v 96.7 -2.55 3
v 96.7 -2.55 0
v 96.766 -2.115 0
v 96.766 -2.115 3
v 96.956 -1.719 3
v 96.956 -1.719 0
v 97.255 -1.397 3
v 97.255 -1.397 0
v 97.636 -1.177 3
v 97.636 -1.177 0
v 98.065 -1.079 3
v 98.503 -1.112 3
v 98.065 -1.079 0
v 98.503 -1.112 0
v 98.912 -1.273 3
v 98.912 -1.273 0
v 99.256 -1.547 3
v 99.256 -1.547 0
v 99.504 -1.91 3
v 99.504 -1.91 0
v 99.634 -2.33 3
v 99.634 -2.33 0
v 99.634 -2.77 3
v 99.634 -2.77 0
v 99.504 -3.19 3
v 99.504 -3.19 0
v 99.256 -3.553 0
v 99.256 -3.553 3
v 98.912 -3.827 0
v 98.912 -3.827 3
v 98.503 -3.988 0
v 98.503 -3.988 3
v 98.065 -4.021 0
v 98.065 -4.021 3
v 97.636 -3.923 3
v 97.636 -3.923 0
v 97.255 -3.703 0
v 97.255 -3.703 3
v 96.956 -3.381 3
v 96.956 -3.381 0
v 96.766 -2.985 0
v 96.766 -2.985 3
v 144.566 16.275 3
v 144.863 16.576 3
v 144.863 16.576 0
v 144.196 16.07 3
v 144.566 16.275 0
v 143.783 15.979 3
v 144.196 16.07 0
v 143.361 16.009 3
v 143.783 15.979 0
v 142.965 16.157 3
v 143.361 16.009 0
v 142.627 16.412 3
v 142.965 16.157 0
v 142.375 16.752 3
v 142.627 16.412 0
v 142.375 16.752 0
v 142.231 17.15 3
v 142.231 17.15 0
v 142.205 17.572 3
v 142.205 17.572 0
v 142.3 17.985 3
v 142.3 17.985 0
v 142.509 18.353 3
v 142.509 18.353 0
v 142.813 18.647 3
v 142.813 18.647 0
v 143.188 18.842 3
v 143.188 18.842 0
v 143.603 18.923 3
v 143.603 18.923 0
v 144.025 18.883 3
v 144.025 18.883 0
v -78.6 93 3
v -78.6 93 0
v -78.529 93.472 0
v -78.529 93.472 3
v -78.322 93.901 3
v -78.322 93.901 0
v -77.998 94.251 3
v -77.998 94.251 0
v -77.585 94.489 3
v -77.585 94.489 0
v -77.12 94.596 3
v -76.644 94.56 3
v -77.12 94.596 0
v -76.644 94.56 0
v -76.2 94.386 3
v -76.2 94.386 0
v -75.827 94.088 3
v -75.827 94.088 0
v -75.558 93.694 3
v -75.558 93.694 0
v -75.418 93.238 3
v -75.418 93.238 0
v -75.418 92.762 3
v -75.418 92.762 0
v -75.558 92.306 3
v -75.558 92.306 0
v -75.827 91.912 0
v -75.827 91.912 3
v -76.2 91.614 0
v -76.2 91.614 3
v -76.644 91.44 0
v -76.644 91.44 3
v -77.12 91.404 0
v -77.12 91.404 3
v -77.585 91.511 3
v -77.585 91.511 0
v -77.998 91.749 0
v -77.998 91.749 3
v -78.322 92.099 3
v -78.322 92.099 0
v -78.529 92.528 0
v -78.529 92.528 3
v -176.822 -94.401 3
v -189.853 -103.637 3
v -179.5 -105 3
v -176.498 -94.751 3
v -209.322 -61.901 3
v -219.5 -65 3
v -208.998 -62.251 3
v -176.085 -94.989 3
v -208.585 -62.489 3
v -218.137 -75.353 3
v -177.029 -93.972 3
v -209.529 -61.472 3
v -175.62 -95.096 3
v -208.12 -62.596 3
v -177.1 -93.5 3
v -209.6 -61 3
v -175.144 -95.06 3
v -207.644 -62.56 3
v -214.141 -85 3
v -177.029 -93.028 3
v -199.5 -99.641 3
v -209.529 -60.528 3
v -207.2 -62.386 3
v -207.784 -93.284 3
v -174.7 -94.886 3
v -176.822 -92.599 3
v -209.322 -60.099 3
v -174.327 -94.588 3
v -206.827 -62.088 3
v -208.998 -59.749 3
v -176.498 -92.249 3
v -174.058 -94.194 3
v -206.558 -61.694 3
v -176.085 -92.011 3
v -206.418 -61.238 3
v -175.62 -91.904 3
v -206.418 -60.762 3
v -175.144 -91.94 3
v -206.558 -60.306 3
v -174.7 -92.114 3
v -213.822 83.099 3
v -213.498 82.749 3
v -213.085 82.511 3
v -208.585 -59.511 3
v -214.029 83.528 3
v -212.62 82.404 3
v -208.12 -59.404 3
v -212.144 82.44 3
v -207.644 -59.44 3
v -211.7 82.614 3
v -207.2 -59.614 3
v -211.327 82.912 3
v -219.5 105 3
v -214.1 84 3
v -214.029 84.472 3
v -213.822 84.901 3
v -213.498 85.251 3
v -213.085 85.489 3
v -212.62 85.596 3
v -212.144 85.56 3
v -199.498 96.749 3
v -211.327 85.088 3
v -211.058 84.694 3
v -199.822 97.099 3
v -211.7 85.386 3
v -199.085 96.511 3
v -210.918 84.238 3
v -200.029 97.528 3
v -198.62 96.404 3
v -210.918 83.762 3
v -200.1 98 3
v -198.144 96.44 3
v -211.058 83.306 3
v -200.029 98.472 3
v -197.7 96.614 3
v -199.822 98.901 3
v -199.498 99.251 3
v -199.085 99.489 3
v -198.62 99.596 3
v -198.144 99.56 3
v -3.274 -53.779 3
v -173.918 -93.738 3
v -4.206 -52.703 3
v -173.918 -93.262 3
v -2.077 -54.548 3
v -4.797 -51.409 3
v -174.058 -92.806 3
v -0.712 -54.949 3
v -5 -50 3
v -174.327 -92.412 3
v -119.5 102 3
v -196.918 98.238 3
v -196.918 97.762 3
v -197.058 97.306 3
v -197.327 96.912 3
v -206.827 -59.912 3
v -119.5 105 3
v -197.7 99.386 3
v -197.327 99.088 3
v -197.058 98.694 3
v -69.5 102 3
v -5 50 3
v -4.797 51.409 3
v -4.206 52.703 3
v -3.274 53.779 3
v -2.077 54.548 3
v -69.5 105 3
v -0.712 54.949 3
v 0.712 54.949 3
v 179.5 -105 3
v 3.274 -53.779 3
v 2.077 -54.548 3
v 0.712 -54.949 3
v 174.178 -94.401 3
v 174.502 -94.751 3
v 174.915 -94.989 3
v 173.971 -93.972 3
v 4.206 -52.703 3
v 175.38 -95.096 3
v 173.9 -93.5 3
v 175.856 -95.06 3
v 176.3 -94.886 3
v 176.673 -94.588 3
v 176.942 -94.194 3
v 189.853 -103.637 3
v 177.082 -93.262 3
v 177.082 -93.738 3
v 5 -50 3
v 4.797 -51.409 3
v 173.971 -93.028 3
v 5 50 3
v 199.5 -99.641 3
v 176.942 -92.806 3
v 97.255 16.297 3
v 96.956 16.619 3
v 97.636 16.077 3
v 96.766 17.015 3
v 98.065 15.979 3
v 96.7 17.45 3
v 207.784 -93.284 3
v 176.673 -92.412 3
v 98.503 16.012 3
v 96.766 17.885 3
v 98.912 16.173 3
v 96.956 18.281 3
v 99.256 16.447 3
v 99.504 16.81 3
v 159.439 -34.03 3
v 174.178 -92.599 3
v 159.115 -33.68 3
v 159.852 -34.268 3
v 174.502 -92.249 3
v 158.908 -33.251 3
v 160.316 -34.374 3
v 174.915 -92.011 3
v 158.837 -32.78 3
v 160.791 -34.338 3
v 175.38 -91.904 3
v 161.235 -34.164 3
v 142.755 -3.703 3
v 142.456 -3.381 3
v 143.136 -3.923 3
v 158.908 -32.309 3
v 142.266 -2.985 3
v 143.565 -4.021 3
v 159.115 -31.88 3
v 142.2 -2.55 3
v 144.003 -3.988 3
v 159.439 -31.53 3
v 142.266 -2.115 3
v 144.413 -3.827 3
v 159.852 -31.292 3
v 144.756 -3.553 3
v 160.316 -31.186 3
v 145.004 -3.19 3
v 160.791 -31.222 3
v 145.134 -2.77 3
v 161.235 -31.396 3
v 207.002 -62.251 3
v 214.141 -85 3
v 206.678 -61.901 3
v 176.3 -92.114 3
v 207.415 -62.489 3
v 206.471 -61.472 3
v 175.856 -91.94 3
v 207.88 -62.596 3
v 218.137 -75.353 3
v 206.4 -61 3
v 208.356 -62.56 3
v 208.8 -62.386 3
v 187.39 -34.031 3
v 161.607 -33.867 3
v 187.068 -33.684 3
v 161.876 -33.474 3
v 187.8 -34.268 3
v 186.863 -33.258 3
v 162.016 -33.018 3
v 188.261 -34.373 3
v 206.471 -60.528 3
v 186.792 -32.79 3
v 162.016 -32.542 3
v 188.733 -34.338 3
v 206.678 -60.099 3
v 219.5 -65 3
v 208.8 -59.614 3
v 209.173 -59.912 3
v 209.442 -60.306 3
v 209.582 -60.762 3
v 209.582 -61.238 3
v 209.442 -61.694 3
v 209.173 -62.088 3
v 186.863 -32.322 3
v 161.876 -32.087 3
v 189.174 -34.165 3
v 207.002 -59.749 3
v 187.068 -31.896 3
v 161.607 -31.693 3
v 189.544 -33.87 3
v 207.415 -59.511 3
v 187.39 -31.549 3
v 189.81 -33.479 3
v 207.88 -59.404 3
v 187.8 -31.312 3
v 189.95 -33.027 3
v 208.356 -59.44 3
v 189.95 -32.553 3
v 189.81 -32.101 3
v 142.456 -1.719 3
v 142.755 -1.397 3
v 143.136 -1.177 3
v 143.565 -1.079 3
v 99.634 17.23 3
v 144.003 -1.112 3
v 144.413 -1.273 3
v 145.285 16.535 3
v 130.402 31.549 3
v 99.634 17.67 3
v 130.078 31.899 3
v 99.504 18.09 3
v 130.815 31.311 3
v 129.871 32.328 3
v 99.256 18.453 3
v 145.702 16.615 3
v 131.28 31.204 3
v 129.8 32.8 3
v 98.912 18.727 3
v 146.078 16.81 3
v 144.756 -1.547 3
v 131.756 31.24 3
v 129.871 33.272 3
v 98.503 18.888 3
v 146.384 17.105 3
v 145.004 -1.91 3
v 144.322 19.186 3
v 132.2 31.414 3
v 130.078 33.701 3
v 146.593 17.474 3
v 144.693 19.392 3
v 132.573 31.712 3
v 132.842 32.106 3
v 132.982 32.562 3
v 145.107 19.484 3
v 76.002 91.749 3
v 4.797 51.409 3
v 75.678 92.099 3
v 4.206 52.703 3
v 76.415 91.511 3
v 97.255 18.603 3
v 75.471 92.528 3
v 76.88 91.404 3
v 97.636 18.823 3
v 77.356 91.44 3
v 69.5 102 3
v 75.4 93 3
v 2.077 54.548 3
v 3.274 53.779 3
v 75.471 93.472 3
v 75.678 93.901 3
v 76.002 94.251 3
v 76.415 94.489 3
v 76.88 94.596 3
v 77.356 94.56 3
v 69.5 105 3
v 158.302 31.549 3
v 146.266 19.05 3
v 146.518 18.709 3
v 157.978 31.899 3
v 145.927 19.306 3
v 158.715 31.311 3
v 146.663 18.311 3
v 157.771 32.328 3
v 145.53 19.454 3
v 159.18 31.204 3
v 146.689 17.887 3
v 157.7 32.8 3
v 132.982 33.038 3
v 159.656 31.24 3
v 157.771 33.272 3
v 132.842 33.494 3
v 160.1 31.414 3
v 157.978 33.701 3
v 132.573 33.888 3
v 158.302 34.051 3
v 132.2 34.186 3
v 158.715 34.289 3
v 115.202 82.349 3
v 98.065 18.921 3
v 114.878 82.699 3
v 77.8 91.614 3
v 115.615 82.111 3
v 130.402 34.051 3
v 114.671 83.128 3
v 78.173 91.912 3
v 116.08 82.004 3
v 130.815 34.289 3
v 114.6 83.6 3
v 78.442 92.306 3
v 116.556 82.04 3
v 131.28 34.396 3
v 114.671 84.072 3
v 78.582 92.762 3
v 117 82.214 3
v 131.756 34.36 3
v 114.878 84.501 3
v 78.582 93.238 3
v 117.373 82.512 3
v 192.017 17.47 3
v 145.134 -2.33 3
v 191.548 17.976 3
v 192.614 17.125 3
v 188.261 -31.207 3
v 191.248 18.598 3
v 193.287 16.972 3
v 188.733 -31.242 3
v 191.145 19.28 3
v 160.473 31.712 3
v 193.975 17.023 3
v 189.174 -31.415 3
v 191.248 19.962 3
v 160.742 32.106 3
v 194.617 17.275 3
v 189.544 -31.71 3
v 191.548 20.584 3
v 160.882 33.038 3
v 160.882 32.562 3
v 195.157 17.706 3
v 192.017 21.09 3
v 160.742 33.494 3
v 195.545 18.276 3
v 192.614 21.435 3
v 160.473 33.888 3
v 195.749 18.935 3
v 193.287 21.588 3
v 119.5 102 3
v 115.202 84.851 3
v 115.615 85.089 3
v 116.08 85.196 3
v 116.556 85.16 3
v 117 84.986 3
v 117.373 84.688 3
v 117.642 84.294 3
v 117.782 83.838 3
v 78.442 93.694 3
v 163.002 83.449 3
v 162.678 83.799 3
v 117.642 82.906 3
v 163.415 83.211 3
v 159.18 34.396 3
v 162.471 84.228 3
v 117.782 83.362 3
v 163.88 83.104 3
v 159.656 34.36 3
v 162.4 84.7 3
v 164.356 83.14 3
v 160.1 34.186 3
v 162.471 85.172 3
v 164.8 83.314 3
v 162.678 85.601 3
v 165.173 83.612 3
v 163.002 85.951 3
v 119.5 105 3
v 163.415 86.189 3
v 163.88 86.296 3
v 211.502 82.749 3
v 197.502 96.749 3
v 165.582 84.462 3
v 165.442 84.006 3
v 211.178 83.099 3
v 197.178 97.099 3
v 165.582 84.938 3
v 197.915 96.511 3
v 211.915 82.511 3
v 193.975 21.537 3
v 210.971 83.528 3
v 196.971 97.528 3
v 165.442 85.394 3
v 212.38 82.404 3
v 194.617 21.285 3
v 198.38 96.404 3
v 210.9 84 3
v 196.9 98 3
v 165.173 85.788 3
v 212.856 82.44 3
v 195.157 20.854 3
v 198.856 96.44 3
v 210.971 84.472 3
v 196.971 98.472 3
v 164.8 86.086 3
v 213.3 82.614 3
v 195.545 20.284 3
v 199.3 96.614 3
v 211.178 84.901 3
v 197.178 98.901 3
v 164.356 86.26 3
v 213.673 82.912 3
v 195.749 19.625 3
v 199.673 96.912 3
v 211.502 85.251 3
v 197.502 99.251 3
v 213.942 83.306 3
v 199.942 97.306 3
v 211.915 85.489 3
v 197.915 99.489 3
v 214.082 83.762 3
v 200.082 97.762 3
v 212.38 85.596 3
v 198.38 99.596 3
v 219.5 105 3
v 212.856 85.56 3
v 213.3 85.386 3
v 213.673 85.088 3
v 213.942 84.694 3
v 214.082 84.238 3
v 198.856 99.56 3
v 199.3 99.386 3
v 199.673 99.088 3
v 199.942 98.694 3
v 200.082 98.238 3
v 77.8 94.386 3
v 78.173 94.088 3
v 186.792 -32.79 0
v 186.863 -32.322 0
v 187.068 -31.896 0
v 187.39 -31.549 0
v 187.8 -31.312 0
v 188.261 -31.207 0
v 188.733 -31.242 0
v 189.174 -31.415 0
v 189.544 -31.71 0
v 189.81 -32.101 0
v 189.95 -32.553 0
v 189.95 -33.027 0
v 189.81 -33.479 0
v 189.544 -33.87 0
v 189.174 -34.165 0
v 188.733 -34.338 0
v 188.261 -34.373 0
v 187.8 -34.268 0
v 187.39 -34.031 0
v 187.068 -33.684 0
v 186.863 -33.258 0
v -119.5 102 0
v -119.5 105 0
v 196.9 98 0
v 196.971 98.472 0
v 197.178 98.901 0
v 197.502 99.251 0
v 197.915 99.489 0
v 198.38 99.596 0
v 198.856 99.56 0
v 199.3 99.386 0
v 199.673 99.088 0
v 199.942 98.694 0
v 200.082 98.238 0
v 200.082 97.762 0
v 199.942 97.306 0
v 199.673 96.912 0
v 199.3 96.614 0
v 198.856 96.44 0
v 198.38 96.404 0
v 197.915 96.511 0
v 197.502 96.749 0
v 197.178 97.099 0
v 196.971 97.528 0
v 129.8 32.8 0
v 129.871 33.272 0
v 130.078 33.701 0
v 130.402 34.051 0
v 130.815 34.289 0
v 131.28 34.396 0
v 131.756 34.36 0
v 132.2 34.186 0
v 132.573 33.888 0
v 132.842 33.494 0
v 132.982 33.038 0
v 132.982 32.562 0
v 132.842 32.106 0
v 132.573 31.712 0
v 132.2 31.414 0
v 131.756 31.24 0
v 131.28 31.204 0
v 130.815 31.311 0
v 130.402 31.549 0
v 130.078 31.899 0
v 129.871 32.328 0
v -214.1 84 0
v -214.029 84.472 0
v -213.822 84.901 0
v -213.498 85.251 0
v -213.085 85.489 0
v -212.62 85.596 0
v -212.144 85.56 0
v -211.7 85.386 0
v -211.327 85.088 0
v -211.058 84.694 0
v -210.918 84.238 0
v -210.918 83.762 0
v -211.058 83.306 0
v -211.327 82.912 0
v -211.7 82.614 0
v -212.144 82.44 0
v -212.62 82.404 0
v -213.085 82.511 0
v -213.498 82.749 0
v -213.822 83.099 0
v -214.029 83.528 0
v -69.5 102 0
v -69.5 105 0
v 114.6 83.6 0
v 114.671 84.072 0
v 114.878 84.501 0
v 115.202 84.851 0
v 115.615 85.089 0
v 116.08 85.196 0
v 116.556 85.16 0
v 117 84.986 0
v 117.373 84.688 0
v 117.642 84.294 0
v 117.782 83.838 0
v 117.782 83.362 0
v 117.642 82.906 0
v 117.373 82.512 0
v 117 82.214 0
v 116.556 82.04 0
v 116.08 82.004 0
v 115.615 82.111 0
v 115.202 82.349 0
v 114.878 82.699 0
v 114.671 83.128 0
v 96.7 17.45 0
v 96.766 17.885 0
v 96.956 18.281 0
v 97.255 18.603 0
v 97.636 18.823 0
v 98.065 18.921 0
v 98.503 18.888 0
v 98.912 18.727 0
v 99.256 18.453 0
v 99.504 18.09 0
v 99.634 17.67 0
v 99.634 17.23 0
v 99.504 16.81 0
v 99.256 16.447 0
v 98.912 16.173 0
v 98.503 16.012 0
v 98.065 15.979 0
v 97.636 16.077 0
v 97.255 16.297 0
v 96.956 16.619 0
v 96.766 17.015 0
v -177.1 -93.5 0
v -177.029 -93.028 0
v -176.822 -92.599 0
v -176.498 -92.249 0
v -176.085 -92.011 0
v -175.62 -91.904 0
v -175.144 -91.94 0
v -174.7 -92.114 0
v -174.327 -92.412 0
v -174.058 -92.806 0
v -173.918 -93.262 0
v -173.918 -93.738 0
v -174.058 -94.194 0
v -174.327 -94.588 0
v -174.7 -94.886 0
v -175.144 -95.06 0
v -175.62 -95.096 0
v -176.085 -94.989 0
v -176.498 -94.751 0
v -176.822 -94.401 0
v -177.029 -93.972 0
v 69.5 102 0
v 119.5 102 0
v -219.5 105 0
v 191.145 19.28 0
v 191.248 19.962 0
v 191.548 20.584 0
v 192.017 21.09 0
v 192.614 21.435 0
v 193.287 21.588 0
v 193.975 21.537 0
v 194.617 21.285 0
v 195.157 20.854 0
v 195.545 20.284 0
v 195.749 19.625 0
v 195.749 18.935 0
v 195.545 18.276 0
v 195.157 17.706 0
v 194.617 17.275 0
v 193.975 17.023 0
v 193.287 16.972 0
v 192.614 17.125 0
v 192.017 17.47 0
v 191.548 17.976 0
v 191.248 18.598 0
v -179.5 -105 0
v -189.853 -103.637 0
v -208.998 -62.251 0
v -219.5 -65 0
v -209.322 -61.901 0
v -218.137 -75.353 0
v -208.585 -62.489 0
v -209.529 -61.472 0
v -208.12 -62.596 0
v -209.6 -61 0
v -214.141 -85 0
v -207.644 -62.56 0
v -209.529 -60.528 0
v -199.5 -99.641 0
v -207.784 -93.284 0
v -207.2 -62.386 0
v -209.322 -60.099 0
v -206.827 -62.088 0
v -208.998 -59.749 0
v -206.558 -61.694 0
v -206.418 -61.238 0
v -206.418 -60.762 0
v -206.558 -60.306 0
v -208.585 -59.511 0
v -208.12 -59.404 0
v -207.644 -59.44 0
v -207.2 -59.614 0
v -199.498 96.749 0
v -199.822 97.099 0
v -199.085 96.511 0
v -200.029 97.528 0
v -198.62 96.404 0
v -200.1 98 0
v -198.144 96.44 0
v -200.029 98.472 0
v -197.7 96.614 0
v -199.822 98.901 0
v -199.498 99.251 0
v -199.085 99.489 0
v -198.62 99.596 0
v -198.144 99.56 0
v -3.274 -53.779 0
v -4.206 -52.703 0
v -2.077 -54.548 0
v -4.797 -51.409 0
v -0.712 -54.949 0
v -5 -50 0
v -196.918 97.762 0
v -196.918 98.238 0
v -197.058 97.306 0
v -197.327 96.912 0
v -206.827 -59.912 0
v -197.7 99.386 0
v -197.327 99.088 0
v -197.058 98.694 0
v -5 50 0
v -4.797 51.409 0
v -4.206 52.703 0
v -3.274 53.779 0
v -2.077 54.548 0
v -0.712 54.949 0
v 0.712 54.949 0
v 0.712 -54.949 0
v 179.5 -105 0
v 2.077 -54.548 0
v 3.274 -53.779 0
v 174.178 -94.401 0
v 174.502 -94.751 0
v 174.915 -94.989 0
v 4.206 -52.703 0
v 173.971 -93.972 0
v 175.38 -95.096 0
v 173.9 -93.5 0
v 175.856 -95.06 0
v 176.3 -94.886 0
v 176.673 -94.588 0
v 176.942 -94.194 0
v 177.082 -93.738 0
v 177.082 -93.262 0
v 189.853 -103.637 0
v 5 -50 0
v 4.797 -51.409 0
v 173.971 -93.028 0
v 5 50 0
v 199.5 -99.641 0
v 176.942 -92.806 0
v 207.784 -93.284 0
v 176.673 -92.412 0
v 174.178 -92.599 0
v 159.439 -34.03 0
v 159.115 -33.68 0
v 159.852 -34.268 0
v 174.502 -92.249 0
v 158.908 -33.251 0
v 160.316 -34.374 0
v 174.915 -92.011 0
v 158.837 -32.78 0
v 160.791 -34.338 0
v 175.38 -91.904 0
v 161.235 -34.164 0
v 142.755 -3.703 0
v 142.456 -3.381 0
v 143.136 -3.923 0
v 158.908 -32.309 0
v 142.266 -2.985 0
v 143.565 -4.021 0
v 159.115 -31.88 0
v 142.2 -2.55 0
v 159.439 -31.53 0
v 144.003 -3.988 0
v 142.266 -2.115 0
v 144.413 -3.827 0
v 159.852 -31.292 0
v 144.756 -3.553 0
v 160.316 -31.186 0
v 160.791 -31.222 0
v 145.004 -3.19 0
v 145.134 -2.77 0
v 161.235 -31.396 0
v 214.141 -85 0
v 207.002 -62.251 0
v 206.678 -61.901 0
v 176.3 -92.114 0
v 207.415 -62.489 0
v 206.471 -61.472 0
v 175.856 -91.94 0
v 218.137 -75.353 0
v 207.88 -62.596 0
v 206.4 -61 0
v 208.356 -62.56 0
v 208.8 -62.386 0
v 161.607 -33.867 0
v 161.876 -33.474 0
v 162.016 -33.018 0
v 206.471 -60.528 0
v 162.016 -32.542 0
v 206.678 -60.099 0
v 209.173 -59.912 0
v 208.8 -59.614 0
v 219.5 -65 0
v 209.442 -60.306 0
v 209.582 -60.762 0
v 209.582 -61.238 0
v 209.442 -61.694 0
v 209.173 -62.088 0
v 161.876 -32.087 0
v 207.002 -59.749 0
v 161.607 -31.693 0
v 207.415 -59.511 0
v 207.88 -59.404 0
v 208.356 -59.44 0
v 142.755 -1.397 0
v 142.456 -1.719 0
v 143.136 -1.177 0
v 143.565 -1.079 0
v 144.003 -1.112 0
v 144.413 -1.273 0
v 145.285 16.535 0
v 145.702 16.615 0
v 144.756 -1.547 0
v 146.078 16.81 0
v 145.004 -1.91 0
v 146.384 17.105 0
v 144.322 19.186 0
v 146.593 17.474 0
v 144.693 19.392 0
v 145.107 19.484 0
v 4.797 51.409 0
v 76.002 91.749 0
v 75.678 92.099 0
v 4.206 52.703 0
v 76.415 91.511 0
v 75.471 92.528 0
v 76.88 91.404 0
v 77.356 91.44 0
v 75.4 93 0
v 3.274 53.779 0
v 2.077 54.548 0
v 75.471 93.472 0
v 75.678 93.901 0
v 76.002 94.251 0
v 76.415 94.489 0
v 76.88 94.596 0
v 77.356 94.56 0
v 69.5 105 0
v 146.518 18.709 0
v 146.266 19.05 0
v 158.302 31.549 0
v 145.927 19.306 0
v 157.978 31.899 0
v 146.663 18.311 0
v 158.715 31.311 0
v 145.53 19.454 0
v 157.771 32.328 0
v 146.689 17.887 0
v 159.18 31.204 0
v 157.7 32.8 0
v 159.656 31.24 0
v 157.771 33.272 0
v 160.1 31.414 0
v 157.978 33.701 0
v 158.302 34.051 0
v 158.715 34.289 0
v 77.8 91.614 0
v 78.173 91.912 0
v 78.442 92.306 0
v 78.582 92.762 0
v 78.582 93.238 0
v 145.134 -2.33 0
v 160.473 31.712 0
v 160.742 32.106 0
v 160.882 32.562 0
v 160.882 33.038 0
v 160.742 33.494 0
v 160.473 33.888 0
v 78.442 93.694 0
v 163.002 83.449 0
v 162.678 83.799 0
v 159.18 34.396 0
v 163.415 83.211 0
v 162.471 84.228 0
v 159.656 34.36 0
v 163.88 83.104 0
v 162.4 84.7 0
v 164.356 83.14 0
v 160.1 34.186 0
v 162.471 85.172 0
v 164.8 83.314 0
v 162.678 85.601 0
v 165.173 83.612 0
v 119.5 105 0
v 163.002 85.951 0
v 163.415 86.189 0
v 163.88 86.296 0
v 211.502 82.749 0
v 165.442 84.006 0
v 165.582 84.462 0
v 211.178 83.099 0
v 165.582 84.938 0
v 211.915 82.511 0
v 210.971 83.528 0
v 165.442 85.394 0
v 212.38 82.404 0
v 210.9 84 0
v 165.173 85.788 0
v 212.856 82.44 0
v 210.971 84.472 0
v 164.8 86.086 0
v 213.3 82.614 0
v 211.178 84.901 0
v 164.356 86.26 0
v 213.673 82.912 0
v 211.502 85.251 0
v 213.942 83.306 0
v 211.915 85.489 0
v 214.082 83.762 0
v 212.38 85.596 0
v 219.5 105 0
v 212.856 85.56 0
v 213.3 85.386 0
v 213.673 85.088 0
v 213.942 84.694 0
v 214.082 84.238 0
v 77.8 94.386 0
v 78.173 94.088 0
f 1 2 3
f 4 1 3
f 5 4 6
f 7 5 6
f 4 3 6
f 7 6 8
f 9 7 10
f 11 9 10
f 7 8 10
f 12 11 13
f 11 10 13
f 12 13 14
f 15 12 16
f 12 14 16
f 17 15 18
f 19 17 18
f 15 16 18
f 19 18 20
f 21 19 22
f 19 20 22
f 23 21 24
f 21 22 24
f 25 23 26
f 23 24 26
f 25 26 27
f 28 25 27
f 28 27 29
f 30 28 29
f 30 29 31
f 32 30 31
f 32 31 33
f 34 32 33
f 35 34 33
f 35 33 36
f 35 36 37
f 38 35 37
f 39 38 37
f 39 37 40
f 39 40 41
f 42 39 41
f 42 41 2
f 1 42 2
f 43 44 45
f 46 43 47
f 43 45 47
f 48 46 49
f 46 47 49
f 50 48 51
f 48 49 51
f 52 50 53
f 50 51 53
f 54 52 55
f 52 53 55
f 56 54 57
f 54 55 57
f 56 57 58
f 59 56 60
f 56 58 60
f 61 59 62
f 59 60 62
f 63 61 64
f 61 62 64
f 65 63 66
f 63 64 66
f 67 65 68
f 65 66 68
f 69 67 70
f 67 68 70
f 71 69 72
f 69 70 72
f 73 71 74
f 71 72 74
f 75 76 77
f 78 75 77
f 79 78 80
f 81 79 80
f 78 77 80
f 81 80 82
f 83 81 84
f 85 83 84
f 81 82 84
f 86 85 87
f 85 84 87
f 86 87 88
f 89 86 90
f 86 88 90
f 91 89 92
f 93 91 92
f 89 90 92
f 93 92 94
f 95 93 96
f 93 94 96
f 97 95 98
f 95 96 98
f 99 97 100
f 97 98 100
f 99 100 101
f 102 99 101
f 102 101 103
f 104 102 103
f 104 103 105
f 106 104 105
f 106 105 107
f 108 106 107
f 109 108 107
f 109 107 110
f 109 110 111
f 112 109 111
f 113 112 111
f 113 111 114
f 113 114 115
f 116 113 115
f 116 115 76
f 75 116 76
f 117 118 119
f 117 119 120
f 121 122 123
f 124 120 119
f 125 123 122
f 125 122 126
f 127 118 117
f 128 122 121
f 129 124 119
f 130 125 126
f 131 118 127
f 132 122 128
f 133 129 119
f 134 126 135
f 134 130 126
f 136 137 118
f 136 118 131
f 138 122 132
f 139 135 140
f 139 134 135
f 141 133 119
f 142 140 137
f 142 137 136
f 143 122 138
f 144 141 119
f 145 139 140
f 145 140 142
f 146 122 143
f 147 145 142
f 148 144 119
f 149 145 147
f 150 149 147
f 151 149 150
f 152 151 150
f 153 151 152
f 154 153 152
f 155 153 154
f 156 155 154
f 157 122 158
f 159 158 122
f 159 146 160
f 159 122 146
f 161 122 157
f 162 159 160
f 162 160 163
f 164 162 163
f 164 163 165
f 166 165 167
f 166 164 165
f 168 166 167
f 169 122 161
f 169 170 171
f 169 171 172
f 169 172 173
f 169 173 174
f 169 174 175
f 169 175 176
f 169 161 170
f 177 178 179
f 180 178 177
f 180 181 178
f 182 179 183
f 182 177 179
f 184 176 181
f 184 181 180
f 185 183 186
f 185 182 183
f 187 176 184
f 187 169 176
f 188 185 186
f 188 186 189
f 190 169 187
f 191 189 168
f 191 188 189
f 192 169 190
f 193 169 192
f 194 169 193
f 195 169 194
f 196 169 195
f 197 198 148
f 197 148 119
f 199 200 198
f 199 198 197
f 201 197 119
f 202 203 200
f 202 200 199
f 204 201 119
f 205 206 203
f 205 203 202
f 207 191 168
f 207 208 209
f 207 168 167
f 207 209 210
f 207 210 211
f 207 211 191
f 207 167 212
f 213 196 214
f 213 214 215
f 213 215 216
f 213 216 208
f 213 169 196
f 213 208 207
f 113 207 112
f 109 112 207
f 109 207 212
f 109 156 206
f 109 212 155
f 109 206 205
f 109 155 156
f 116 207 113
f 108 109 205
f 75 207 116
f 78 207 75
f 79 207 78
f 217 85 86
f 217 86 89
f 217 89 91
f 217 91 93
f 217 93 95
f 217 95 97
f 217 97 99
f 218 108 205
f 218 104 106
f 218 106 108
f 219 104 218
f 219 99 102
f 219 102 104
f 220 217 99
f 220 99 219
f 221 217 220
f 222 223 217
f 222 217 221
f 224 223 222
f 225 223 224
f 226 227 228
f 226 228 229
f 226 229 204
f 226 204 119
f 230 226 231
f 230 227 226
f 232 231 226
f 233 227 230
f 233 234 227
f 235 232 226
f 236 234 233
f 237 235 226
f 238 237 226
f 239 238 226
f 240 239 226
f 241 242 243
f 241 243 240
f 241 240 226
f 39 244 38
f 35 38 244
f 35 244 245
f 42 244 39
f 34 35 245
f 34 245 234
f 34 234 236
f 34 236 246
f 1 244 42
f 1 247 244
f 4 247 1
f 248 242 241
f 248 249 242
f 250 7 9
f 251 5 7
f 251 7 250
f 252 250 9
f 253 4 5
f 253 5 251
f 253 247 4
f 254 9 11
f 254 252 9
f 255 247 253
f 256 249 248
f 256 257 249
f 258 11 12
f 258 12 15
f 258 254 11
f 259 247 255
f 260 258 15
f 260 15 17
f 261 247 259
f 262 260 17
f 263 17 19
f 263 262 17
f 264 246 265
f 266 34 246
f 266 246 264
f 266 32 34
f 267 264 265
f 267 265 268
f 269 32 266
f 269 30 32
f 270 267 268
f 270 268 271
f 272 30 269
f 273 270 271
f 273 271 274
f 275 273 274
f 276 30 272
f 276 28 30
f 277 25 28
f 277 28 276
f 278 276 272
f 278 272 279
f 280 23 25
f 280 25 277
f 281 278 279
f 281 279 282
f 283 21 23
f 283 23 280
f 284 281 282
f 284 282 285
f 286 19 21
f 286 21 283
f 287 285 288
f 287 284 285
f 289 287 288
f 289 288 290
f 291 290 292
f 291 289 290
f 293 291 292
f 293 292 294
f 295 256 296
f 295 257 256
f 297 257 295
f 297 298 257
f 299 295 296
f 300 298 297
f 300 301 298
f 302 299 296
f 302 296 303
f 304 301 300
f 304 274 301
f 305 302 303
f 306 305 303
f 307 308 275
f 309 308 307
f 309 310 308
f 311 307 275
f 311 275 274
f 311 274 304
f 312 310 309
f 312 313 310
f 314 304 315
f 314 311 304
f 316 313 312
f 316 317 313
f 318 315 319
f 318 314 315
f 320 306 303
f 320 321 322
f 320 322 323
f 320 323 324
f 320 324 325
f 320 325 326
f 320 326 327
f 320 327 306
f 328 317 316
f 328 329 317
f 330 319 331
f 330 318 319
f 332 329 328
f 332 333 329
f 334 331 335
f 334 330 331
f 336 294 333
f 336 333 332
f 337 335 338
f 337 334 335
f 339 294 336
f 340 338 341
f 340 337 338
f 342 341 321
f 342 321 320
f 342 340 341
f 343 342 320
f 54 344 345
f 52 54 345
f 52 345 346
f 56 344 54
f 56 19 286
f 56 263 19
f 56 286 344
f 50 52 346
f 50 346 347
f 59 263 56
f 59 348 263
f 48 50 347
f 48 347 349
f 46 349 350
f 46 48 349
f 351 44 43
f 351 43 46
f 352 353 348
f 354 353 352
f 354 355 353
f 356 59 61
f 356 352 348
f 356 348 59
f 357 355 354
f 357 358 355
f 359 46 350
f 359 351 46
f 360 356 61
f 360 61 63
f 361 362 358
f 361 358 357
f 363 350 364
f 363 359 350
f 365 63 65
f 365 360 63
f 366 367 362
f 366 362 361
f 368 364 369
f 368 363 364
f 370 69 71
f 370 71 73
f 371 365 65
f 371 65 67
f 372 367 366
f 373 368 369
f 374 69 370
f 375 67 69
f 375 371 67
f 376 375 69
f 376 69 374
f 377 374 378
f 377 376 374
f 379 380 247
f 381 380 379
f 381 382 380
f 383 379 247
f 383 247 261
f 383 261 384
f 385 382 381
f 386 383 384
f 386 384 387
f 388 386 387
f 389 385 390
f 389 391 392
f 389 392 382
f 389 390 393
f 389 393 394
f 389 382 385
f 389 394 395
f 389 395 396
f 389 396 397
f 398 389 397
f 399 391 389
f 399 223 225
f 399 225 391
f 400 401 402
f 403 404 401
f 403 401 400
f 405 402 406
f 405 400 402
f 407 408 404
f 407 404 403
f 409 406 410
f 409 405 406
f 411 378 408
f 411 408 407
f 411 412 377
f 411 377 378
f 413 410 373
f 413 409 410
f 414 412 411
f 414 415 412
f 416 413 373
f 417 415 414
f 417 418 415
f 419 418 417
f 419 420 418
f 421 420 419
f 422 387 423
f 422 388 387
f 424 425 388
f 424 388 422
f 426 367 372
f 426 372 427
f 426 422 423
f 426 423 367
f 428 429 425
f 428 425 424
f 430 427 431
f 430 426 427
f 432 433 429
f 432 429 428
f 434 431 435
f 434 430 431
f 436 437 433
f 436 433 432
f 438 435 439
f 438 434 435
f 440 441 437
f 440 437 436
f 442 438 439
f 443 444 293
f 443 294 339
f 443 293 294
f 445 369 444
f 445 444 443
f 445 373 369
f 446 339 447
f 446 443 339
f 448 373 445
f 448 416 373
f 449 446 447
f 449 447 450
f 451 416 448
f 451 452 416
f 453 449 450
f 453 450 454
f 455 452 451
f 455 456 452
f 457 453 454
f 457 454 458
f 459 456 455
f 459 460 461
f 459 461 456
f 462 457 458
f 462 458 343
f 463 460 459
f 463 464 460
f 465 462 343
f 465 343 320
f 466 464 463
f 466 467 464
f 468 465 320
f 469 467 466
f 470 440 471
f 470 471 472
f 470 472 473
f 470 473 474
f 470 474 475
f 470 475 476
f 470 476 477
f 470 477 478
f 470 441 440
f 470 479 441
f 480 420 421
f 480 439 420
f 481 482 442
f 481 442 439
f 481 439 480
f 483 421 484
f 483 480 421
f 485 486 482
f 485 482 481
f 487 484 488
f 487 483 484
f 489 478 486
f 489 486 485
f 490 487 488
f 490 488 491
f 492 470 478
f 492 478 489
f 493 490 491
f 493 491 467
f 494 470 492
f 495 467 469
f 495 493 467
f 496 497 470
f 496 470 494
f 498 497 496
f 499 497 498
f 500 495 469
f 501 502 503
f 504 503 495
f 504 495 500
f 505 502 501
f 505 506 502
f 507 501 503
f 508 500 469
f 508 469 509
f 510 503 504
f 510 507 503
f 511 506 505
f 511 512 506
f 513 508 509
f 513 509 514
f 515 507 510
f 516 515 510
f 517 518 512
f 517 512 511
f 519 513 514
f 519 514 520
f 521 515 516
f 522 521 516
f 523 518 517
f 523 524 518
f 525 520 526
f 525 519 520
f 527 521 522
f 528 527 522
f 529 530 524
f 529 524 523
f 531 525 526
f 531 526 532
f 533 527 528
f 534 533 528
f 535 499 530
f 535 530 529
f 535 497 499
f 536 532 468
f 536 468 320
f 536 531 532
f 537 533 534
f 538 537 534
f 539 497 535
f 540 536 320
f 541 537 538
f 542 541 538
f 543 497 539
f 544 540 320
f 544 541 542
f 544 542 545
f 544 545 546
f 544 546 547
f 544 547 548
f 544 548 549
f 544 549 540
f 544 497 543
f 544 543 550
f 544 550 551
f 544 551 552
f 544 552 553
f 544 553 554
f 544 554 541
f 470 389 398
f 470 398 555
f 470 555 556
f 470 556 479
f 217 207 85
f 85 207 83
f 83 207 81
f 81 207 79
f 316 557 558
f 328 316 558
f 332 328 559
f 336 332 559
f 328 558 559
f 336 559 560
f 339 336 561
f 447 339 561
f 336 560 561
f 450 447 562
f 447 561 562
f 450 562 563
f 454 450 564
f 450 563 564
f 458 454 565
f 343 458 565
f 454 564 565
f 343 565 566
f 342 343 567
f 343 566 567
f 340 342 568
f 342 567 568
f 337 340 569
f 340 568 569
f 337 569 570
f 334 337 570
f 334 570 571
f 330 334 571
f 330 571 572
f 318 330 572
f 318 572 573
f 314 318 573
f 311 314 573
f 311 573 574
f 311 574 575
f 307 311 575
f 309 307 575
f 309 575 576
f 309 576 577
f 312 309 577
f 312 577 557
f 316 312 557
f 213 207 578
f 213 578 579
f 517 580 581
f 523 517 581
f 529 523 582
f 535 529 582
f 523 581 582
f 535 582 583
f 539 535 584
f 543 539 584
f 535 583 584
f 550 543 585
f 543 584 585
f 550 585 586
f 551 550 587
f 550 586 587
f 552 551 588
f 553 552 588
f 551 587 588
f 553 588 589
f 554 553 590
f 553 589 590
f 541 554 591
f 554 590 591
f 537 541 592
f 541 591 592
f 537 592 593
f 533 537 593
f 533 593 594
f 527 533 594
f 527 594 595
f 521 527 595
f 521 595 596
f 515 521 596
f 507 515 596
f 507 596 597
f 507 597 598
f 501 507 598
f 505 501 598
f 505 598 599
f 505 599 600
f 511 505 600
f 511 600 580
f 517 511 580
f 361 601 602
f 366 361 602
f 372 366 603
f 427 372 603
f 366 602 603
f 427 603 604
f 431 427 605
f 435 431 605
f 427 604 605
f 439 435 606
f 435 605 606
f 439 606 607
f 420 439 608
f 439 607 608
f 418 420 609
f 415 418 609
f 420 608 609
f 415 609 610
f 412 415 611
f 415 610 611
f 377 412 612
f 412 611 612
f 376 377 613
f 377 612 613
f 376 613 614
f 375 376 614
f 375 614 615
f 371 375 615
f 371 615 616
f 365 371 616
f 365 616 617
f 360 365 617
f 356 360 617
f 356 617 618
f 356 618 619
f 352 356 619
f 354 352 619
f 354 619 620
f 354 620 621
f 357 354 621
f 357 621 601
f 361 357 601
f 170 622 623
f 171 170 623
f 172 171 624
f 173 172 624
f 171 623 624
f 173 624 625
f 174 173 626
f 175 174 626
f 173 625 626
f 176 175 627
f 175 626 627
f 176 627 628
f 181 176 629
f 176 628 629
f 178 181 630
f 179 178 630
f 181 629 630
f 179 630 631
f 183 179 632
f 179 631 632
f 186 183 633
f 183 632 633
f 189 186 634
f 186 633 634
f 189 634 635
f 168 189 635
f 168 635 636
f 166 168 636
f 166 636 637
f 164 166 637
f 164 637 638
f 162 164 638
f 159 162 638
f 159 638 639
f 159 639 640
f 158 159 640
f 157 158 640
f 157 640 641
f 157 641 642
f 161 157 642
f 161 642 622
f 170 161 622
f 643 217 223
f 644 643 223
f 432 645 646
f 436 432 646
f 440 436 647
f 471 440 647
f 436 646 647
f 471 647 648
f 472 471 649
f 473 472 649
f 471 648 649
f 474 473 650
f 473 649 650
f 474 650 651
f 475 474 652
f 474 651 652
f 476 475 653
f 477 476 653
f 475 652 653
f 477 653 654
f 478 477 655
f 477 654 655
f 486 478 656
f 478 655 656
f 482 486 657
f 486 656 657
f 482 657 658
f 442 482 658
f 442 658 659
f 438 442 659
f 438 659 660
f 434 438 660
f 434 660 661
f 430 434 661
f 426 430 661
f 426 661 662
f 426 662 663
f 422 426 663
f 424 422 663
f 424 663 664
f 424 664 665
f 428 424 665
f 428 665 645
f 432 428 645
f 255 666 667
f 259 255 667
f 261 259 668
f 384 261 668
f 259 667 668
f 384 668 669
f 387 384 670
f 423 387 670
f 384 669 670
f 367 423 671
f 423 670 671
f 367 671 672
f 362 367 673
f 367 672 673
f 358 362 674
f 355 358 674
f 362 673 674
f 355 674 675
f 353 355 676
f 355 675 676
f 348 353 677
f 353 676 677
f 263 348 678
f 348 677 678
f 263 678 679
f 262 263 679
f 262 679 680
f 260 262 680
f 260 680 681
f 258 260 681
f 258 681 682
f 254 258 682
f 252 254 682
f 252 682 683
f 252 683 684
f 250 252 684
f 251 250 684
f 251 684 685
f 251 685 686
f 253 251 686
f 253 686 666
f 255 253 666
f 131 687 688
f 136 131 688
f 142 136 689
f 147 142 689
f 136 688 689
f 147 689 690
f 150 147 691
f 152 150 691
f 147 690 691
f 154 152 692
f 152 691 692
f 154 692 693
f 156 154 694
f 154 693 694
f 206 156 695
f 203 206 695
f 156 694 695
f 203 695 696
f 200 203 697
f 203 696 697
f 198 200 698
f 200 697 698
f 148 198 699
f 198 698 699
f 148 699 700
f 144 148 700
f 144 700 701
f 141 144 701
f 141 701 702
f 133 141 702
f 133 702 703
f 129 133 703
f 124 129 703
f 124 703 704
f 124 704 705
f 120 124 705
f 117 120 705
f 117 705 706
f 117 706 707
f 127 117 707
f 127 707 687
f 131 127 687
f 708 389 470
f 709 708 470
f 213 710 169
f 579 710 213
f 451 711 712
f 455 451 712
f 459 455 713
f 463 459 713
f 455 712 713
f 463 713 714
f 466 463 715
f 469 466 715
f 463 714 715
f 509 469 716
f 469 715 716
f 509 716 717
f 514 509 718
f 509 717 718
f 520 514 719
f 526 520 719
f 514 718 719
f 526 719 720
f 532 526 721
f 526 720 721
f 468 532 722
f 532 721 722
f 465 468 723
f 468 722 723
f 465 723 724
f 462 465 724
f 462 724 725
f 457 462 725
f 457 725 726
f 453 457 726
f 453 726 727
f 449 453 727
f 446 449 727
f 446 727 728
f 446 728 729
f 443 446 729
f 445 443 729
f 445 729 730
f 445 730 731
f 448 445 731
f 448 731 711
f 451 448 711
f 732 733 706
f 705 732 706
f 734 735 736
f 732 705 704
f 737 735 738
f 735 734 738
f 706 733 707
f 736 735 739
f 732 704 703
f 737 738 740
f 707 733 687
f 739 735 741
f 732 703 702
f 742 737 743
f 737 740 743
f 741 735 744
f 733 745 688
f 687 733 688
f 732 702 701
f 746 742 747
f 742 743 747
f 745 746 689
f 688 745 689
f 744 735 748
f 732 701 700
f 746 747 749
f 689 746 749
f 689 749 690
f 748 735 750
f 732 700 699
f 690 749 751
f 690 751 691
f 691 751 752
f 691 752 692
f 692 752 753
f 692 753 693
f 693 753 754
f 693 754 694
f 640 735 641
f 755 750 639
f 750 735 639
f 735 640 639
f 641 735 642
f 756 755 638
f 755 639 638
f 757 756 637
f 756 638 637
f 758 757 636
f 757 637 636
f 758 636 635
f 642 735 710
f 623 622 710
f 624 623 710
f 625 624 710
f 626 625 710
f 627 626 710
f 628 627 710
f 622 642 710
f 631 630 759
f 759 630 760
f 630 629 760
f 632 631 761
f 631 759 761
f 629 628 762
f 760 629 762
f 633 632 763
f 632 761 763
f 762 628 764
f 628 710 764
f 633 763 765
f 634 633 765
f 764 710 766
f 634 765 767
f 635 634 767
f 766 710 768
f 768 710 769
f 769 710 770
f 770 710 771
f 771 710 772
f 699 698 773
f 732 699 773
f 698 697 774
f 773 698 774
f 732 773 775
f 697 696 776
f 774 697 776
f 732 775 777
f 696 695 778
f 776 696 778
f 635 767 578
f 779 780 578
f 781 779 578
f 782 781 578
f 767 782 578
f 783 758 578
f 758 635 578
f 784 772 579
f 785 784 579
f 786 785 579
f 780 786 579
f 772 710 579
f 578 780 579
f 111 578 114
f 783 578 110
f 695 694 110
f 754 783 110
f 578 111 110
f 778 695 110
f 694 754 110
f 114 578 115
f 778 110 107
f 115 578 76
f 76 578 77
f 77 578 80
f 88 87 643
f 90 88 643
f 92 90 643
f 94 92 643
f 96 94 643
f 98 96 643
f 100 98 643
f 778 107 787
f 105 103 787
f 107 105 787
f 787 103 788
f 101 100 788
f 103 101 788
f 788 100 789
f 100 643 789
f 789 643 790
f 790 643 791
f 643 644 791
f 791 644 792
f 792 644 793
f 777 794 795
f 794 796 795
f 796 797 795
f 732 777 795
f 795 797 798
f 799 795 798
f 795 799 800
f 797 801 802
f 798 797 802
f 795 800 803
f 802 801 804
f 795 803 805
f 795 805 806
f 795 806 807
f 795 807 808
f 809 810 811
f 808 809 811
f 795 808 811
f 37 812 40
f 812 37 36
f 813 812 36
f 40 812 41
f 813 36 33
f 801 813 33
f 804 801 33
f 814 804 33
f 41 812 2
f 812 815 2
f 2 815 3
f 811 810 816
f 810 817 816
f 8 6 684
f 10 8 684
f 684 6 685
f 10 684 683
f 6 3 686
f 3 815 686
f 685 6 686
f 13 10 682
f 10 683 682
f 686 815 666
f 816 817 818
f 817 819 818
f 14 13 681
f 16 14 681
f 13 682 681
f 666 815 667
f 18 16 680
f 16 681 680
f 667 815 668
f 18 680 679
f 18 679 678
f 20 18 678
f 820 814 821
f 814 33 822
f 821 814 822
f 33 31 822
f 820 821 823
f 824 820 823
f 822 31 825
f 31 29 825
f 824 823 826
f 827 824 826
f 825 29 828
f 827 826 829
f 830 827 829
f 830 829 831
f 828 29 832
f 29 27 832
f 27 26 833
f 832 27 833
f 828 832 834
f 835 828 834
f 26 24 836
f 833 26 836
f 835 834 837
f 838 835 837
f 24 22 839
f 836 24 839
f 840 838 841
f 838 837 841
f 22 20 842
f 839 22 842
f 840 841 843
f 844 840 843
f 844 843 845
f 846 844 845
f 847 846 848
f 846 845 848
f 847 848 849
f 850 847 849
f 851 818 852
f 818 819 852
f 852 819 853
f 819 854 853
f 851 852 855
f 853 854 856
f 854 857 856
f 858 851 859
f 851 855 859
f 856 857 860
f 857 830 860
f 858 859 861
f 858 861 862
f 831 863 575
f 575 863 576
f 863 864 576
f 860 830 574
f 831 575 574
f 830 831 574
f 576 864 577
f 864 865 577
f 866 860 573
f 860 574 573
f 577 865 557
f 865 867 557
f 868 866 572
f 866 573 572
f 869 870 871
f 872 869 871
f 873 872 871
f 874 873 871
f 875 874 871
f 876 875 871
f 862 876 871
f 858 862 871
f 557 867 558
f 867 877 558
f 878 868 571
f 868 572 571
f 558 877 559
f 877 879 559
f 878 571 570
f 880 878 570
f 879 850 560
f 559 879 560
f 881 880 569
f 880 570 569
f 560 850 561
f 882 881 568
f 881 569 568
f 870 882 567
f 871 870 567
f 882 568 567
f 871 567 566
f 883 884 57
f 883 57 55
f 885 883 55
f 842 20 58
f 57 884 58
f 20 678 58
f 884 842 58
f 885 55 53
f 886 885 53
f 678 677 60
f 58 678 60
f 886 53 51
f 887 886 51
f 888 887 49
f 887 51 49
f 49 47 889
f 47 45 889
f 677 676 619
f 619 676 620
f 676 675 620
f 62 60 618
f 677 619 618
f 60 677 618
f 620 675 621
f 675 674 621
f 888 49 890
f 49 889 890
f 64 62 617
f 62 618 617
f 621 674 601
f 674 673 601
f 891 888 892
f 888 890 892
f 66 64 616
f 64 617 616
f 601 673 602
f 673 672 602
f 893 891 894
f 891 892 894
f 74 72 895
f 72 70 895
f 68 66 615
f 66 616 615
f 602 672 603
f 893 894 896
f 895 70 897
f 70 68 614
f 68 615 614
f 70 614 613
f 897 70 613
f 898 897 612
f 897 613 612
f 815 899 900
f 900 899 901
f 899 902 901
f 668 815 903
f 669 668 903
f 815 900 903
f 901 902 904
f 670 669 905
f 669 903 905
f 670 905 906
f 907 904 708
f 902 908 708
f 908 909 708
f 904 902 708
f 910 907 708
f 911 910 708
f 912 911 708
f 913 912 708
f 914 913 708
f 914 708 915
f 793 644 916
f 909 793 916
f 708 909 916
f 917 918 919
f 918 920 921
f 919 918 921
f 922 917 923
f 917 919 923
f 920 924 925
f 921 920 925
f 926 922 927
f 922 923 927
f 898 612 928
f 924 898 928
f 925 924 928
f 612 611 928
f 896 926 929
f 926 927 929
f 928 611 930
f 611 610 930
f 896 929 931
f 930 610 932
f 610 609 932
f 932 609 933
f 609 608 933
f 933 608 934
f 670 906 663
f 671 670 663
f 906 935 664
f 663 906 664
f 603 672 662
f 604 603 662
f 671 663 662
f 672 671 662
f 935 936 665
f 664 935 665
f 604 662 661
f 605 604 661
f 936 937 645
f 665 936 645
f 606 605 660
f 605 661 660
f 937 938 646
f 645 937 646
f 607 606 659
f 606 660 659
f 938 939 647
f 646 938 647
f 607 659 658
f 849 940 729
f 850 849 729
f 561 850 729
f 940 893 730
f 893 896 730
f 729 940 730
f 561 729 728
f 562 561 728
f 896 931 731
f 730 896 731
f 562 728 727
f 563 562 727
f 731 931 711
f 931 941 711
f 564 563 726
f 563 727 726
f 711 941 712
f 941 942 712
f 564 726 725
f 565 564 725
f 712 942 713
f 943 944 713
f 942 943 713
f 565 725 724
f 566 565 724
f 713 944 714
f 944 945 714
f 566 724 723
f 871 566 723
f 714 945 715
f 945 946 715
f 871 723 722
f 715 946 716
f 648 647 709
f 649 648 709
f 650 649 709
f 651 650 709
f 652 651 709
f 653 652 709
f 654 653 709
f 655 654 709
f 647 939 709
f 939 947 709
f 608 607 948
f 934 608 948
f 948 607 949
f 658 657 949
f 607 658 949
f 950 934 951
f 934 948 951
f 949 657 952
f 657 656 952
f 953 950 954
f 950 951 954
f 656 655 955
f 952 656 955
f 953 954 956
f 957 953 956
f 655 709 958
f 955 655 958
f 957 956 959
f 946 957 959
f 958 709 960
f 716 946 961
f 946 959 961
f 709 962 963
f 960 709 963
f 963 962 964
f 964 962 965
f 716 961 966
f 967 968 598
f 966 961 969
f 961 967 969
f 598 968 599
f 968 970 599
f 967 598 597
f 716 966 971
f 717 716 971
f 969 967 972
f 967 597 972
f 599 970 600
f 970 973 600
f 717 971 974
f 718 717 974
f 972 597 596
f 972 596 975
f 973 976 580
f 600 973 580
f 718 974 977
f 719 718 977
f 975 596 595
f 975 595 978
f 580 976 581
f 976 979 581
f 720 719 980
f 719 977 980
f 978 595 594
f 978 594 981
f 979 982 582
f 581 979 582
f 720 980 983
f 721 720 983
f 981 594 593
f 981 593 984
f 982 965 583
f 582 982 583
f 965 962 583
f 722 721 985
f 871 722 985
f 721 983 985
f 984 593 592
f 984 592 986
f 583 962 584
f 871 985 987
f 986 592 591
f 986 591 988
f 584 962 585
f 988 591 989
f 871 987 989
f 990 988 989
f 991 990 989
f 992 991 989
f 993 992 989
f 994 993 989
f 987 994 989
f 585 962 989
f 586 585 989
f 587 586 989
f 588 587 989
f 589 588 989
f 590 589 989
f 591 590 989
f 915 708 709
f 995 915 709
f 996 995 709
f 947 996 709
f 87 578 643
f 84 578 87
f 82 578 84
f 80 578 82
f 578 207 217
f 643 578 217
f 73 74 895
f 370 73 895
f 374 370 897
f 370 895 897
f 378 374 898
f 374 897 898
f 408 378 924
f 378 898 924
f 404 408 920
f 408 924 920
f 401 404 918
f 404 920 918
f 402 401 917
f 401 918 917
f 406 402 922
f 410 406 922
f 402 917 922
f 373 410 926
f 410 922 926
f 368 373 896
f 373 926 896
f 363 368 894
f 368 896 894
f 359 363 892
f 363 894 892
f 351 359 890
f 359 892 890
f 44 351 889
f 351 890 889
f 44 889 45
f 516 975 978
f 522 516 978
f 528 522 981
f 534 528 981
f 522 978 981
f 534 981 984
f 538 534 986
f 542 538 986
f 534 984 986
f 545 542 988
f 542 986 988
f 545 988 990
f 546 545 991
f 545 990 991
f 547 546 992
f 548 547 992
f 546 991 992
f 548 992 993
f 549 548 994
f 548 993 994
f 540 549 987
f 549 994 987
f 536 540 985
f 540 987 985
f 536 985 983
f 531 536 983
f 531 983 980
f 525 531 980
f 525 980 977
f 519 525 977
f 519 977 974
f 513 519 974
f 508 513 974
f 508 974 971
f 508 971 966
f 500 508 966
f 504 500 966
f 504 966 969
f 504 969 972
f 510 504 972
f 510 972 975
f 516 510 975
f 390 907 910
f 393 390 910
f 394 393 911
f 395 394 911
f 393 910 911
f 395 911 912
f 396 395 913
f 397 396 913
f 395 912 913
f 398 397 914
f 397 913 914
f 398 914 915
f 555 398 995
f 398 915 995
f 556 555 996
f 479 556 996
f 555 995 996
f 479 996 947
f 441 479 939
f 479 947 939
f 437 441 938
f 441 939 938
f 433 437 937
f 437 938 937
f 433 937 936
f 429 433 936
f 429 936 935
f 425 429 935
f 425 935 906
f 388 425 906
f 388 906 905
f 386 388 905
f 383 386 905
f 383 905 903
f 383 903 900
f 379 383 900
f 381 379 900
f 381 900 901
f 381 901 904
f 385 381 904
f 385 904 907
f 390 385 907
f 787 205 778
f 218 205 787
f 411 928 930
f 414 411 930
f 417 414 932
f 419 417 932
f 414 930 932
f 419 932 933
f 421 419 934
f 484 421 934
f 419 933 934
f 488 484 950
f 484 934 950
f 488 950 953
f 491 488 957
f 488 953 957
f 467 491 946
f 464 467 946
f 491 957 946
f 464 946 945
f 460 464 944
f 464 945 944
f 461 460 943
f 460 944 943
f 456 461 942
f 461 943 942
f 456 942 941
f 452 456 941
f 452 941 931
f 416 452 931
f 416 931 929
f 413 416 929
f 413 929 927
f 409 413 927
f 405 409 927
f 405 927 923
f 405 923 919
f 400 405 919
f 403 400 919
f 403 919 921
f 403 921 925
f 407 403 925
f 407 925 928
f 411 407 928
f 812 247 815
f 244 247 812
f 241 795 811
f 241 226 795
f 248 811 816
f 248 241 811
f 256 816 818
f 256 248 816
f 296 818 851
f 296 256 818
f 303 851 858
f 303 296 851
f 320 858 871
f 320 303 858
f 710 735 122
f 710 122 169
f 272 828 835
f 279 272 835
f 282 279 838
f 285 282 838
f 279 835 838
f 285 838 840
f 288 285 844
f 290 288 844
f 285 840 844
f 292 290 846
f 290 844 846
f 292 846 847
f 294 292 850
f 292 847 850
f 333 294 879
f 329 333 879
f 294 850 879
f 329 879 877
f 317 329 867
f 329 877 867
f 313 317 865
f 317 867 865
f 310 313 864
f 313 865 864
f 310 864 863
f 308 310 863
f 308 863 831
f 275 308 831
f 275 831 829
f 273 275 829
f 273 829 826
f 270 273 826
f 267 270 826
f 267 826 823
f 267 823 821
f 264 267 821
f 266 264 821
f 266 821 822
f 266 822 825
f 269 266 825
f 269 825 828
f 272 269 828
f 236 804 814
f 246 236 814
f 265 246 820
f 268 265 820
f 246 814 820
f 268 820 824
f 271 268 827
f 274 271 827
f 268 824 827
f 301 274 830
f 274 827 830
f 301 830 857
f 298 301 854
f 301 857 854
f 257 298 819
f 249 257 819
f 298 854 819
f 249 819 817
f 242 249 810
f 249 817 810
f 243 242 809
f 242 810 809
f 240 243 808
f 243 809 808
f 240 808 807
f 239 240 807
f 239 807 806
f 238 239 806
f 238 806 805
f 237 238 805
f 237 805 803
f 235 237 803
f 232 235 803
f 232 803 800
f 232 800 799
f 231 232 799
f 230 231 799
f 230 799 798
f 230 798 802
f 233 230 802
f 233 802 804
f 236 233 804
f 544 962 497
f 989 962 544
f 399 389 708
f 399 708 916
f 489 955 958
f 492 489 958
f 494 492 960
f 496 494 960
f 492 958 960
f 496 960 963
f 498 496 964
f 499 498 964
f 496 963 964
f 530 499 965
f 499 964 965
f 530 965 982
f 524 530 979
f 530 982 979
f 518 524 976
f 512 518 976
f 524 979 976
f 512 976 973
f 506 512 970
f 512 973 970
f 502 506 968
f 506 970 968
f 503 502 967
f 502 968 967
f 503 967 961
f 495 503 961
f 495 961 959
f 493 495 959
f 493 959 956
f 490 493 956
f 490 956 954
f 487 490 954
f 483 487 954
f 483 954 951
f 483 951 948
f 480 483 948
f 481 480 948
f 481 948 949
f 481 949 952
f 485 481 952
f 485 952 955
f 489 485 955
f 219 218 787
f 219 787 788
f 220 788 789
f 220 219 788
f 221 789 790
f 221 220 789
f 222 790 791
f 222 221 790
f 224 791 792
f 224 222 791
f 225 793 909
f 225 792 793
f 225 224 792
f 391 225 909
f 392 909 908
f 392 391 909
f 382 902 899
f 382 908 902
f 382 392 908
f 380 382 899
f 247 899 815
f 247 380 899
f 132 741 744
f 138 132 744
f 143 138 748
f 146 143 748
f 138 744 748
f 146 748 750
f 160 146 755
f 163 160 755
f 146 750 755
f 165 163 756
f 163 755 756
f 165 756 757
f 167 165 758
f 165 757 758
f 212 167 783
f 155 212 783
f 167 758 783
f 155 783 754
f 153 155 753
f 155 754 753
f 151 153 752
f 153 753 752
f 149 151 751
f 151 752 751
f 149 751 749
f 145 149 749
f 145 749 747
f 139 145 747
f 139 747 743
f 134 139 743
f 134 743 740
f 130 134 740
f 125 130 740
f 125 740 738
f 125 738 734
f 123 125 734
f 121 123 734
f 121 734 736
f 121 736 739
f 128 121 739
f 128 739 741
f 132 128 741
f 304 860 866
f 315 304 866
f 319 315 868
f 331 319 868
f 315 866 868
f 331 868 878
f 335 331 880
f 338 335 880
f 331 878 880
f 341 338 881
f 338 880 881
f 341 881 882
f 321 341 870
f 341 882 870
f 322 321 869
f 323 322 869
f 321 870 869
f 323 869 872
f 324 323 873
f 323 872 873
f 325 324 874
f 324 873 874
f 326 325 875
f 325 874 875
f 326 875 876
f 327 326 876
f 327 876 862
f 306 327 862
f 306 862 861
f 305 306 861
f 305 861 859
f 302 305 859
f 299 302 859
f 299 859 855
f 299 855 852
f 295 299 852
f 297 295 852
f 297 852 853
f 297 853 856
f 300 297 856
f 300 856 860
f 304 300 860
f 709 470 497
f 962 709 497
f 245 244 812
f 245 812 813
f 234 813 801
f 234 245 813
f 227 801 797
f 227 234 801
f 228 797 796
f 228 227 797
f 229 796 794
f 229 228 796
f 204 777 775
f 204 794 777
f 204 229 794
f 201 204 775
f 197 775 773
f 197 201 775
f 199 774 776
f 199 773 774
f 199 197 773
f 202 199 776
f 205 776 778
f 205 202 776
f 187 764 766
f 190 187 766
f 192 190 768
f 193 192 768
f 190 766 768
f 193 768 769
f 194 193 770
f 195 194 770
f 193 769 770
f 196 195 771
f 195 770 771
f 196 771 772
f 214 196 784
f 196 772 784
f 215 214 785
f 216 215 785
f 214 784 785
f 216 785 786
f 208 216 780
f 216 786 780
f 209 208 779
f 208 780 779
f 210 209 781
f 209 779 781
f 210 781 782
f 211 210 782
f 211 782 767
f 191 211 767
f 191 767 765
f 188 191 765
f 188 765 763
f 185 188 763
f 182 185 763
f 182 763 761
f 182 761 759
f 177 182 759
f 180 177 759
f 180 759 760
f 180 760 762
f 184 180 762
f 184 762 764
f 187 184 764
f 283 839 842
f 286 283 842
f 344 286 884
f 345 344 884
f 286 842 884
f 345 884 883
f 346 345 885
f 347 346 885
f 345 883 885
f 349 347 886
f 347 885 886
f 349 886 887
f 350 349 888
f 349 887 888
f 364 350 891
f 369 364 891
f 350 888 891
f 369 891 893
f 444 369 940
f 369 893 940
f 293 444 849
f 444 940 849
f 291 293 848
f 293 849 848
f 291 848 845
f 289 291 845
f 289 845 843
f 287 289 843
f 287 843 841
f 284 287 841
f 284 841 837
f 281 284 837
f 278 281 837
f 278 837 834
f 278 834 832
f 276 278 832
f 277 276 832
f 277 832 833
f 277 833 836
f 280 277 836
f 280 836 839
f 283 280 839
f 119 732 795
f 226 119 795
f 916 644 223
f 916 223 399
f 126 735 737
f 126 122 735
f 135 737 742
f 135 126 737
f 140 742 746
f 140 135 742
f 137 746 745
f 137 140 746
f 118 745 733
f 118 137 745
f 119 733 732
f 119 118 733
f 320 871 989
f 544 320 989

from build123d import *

# Parameters (mm, degrees)
ESQUISSE1_W             = 439
ESQUISSE1_H             = 210
BOSS_EXTRU_1_DEPTH      = 3
ESQUISSE5_R             = 1.477381552
ESQUISSE5_R_2           = 1.598396888
ESQUISSE5_R_3           = 1.5875
ESQUISSE5_R_4           = 2.314661152
ENL_V_MAT_EXTRU_3_DEPTH = 4
ESQUISSE10_W            = 50
ESQUISSE10_H            = 3
ENL_V_MAT_EXTRU_5_DEPTH = 4
ENL_V_MAT_EXTRU_6_DEPTH = 244.33978302
FILLET1_R               = 40
SKETCH1_R               = 1.6
CUT_EXTRUDE1_DEPTH      = 244.33978302
SKETCH2_R               = 1.6
CUT_EXTRUDE2_DEPTH      = 244.33978302
SKETCH3_R               = 1.6
CUT_EXTRUDE3_DEPTH      = 244.33978302
SKETCH4_R               = 1.6
CUT_EXTRUDE4_DEPTH      = 244.33978302
SKETCH5_R               = 1.6
CUT_EXTRUDE5_DEPTH      = 244.33978302
SKETCH7_R               = 1.6
CUT_EXTRUDE6_DEPTH      = 244.33978302
SKETCH8_R               = 1.475
CUT_EXTRUDE7_DEPTH      = 244.33978302


with BuildPart() as part:
    # Esquisse1 → Boss.-Extru.1 (new body)
    with BuildSketch(Plane.XY):
        Rectangle(ESQUISSE1_W, ESQUISSE1_H)
    extrude(amount=BOSS_EXTRU_1_DEPTH)

    # Esquisse5 → Enlèv. mat.-Extru.3 (cut)
    with BuildSketch(Plane(origin=(0, 0, 0), x_dir=(-1, 0, 0), z_dir=(0, 0, -1))):
        with Locations((-145.216701852, 18.010439522)):
            Circle(ESQUISSE5_R)
        with Locations((-160.435580246, -32.780039682)):
            Circle(ESQUISSE5_R_2)
        with Locations((-188.38, -32.79)):
            Circle(ESQUISSE5_R_3)
        with Locations((-193.46, 19.28)):
            Circle(ESQUISSE5_R_4)
    extrude(amount=-ENL_V_MAT_EXTRU_3_DEPTH, mode=Mode.SUBTRACT)

    # Esquisse10 → Enlèv. mat.-Extru.5 (cut)
    with BuildSketch(Plane.XY.offset(3)):
        with Locations((-94.5, 103.5)):
            Rectangle(ESQUISSE10_W, ESQUISSE10_H)
        with Locations((94.5, 103.5)):
            Rectangle(ESQUISSE10_W, ESQUISSE10_H)
    extrude(amount=-ENL_V_MAT_EXTRU_5_DEPTH, mode=Mode.SUBTRACT)

    # Esquisse11 → Enlèv. mat.-Extru.6 (cut, through all)
    with BuildSketch(Plane.XY.offset(3)):
        with BuildLine():
            Line((-5, -50), (-5, 50))
            ThreePointArc((-5, 50), (0, 55), (5, 50))
            Line((5, 50), (5, -50))
            ThreePointArc((5, -50), (0, -55), (-5, -50))
        make_face()
    extrude(amount=-ENL_V_MAT_EXTRU_6_DEPTH, mode=Mode.SUBTRACT)

    # Fillet1
    fillet1_edges = [part.edges().sort_by_distance(p)[0] for p in [
        (219.5, -105, 1.5),
        (-219.5, -105, 1.5),
    ]]
    fillet(fillet1_edges, radius=FILLET1_R)

    # Sketch1 → Cut-Extrude1 (cut, through all)
    with BuildSketch(Plane(origin=(0, 0, 0), x_dir=(-1, 0, 0), z_dir=(0, 0, -1))):
        with Locations((-208, -61)):
            Circle(SKETCH1_R)
    extrude(amount=-CUT_EXTRUDE1_DEPTH, mode=Mode.SUBTRACT)

    # Sketch2 → Cut-Extrude2 (cut, through all)
    with BuildSketch(Plane(origin=(0, 0, 0), x_dir=(-1, 0, 0), z_dir=(0, 0, -1))):
        with Locations((208, -61)):
            Circle(SKETCH2_R)
        with Locations((175.5, -93.5)):
            Circle(SKETCH2_R)
    extrude(amount=-CUT_EXTRUDE2_DEPTH, mode=Mode.SUBTRACT)

    # Sketch3 → Cut-Extrude3 (cut, through all)
    with BuildSketch(Plane(origin=(0, 0, 0), x_dir=(-1, 0, 0), z_dir=(0, 0, -1))):
        with Locations((-175.5, -93.5)):
            Circle(SKETCH3_R)
    extrude(amount=-CUT_EXTRUDE3_DEPTH, mode=Mode.SUBTRACT)

    # Sketch4 → Cut-Extrude4 (cut, through all)
    with BuildSketch(Plane(origin=(0, 0, 0), x_dir=(-1, 0, 0), z_dir=(0, 0, -1))):
        with Locations((-198.5, 98)):
            Circle(SKETCH4_R)
        with Locations((-212.5, 84)):
            Circle(SKETCH4_R)
        with Locations((198.5, 98)):
            Circle(SKETCH4_R)
        with Locations((212.5, 84)):
            Circle(SKETCH4_R)
    extrude(amount=-CUT_EXTRUDE4_DEPTH, mode=Mode.SUBTRACT)

    # Sketch5 → Cut-Extrude5 (cut, through all)
    with BuildSketch(Plane(origin=(0, 0, 0), x_dir=(-1, 0, 0), z_dir=(0, 0, -1))):
        with Locations((77, 93)):
            Circle(SKETCH5_R)
        with Locations((-77, 93)):
            Circle(SKETCH5_R)
    extrude(amount=-CUT_EXTRUDE5_DEPTH, mode=Mode.SUBTRACT)

    # Sketch7 → Cut-Extrude6 (cut, through all)
    with BuildSketch(Plane(origin=(0, 0, 0), x_dir=(-1, 0, 0), z_dir=(0, 0, -1))):
        with Locations((-131.4, 32.8)):
            Circle(SKETCH7_R)
        with Locations((-159.3, 32.8)):
            Circle(SKETCH7_R)
        with Locations((-116.2, 83.6)):
            Circle(SKETCH7_R)
        with Locations((-164, 84.7)):
            Circle(SKETCH7_R)
    extrude(amount=-CUT_EXTRUDE6_DEPTH, mode=Mode.SUBTRACT)

    # Sketch8 → Cut-Extrude7 (cut, through all)
    with BuildSketch(Plane(origin=(0, 0, 0), x_dir=(-1, 0, 0), z_dir=(0, 0, -1))):
        with Locations((-98.175, -2.55)):
            Circle(SKETCH8_R)
        with Locations((-98.175, 17.45)):
            Circle(SKETCH8_R)
        with Locations((-143.675, 17.45)):
            Circle(SKETCH8_R)
        with Locations((-143.675, -2.55)):
            Circle(SKETCH8_R)
    extrude(amount=-CUT_EXTRUDE7_DEPTH, mode=Mode.SUBTRACT)


solid = part.part
